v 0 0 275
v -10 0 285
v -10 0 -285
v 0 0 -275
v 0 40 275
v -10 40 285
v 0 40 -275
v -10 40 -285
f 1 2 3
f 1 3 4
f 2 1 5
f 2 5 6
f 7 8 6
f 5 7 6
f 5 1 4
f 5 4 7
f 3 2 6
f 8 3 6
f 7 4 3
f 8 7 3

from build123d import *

# Parameters (mm, degrees)
ESQUISSE1_W             = 10
ESQUISSE1_H             = 40
BOSS_EXTRU_1_DEPTH      = 300
ENL_V_MAT_EXTRU_1_DEPTH = 303.820078595


with BuildPart() as part:
    # Esquisse1 → Boss.-Extru.1 (new, symmetric)
    with BuildSketch(Plane.XY):
        with Locations((-5, 20)):
            Rectangle(ESQUISSE1_W, ESQUISSE1_H)
    extrude(amount=BOSS_EXTRU_1_DEPTH, both=True)

    # Esquisse2 → Enlèv. mat.-Extru.1 (cut, symmetric)
    with BuildSketch(Plane.XZ):
        Polygon((0, 275), (-10, 285), (-10, 300), (0, 300), align=None)
    enl_v_mat_extru_1 = extrude(amount=ENL_V_MAT_EXTRU_1_DEPTH, both=True, mode=Mode.SUBTRACT)

    # Symétrie1: Enlèv. mat.-Extru.1 across plane
    add(enl_v_mat_extru_1.mirror(Plane.XY), mode=Mode.SUBTRACT)


solid = part.part
